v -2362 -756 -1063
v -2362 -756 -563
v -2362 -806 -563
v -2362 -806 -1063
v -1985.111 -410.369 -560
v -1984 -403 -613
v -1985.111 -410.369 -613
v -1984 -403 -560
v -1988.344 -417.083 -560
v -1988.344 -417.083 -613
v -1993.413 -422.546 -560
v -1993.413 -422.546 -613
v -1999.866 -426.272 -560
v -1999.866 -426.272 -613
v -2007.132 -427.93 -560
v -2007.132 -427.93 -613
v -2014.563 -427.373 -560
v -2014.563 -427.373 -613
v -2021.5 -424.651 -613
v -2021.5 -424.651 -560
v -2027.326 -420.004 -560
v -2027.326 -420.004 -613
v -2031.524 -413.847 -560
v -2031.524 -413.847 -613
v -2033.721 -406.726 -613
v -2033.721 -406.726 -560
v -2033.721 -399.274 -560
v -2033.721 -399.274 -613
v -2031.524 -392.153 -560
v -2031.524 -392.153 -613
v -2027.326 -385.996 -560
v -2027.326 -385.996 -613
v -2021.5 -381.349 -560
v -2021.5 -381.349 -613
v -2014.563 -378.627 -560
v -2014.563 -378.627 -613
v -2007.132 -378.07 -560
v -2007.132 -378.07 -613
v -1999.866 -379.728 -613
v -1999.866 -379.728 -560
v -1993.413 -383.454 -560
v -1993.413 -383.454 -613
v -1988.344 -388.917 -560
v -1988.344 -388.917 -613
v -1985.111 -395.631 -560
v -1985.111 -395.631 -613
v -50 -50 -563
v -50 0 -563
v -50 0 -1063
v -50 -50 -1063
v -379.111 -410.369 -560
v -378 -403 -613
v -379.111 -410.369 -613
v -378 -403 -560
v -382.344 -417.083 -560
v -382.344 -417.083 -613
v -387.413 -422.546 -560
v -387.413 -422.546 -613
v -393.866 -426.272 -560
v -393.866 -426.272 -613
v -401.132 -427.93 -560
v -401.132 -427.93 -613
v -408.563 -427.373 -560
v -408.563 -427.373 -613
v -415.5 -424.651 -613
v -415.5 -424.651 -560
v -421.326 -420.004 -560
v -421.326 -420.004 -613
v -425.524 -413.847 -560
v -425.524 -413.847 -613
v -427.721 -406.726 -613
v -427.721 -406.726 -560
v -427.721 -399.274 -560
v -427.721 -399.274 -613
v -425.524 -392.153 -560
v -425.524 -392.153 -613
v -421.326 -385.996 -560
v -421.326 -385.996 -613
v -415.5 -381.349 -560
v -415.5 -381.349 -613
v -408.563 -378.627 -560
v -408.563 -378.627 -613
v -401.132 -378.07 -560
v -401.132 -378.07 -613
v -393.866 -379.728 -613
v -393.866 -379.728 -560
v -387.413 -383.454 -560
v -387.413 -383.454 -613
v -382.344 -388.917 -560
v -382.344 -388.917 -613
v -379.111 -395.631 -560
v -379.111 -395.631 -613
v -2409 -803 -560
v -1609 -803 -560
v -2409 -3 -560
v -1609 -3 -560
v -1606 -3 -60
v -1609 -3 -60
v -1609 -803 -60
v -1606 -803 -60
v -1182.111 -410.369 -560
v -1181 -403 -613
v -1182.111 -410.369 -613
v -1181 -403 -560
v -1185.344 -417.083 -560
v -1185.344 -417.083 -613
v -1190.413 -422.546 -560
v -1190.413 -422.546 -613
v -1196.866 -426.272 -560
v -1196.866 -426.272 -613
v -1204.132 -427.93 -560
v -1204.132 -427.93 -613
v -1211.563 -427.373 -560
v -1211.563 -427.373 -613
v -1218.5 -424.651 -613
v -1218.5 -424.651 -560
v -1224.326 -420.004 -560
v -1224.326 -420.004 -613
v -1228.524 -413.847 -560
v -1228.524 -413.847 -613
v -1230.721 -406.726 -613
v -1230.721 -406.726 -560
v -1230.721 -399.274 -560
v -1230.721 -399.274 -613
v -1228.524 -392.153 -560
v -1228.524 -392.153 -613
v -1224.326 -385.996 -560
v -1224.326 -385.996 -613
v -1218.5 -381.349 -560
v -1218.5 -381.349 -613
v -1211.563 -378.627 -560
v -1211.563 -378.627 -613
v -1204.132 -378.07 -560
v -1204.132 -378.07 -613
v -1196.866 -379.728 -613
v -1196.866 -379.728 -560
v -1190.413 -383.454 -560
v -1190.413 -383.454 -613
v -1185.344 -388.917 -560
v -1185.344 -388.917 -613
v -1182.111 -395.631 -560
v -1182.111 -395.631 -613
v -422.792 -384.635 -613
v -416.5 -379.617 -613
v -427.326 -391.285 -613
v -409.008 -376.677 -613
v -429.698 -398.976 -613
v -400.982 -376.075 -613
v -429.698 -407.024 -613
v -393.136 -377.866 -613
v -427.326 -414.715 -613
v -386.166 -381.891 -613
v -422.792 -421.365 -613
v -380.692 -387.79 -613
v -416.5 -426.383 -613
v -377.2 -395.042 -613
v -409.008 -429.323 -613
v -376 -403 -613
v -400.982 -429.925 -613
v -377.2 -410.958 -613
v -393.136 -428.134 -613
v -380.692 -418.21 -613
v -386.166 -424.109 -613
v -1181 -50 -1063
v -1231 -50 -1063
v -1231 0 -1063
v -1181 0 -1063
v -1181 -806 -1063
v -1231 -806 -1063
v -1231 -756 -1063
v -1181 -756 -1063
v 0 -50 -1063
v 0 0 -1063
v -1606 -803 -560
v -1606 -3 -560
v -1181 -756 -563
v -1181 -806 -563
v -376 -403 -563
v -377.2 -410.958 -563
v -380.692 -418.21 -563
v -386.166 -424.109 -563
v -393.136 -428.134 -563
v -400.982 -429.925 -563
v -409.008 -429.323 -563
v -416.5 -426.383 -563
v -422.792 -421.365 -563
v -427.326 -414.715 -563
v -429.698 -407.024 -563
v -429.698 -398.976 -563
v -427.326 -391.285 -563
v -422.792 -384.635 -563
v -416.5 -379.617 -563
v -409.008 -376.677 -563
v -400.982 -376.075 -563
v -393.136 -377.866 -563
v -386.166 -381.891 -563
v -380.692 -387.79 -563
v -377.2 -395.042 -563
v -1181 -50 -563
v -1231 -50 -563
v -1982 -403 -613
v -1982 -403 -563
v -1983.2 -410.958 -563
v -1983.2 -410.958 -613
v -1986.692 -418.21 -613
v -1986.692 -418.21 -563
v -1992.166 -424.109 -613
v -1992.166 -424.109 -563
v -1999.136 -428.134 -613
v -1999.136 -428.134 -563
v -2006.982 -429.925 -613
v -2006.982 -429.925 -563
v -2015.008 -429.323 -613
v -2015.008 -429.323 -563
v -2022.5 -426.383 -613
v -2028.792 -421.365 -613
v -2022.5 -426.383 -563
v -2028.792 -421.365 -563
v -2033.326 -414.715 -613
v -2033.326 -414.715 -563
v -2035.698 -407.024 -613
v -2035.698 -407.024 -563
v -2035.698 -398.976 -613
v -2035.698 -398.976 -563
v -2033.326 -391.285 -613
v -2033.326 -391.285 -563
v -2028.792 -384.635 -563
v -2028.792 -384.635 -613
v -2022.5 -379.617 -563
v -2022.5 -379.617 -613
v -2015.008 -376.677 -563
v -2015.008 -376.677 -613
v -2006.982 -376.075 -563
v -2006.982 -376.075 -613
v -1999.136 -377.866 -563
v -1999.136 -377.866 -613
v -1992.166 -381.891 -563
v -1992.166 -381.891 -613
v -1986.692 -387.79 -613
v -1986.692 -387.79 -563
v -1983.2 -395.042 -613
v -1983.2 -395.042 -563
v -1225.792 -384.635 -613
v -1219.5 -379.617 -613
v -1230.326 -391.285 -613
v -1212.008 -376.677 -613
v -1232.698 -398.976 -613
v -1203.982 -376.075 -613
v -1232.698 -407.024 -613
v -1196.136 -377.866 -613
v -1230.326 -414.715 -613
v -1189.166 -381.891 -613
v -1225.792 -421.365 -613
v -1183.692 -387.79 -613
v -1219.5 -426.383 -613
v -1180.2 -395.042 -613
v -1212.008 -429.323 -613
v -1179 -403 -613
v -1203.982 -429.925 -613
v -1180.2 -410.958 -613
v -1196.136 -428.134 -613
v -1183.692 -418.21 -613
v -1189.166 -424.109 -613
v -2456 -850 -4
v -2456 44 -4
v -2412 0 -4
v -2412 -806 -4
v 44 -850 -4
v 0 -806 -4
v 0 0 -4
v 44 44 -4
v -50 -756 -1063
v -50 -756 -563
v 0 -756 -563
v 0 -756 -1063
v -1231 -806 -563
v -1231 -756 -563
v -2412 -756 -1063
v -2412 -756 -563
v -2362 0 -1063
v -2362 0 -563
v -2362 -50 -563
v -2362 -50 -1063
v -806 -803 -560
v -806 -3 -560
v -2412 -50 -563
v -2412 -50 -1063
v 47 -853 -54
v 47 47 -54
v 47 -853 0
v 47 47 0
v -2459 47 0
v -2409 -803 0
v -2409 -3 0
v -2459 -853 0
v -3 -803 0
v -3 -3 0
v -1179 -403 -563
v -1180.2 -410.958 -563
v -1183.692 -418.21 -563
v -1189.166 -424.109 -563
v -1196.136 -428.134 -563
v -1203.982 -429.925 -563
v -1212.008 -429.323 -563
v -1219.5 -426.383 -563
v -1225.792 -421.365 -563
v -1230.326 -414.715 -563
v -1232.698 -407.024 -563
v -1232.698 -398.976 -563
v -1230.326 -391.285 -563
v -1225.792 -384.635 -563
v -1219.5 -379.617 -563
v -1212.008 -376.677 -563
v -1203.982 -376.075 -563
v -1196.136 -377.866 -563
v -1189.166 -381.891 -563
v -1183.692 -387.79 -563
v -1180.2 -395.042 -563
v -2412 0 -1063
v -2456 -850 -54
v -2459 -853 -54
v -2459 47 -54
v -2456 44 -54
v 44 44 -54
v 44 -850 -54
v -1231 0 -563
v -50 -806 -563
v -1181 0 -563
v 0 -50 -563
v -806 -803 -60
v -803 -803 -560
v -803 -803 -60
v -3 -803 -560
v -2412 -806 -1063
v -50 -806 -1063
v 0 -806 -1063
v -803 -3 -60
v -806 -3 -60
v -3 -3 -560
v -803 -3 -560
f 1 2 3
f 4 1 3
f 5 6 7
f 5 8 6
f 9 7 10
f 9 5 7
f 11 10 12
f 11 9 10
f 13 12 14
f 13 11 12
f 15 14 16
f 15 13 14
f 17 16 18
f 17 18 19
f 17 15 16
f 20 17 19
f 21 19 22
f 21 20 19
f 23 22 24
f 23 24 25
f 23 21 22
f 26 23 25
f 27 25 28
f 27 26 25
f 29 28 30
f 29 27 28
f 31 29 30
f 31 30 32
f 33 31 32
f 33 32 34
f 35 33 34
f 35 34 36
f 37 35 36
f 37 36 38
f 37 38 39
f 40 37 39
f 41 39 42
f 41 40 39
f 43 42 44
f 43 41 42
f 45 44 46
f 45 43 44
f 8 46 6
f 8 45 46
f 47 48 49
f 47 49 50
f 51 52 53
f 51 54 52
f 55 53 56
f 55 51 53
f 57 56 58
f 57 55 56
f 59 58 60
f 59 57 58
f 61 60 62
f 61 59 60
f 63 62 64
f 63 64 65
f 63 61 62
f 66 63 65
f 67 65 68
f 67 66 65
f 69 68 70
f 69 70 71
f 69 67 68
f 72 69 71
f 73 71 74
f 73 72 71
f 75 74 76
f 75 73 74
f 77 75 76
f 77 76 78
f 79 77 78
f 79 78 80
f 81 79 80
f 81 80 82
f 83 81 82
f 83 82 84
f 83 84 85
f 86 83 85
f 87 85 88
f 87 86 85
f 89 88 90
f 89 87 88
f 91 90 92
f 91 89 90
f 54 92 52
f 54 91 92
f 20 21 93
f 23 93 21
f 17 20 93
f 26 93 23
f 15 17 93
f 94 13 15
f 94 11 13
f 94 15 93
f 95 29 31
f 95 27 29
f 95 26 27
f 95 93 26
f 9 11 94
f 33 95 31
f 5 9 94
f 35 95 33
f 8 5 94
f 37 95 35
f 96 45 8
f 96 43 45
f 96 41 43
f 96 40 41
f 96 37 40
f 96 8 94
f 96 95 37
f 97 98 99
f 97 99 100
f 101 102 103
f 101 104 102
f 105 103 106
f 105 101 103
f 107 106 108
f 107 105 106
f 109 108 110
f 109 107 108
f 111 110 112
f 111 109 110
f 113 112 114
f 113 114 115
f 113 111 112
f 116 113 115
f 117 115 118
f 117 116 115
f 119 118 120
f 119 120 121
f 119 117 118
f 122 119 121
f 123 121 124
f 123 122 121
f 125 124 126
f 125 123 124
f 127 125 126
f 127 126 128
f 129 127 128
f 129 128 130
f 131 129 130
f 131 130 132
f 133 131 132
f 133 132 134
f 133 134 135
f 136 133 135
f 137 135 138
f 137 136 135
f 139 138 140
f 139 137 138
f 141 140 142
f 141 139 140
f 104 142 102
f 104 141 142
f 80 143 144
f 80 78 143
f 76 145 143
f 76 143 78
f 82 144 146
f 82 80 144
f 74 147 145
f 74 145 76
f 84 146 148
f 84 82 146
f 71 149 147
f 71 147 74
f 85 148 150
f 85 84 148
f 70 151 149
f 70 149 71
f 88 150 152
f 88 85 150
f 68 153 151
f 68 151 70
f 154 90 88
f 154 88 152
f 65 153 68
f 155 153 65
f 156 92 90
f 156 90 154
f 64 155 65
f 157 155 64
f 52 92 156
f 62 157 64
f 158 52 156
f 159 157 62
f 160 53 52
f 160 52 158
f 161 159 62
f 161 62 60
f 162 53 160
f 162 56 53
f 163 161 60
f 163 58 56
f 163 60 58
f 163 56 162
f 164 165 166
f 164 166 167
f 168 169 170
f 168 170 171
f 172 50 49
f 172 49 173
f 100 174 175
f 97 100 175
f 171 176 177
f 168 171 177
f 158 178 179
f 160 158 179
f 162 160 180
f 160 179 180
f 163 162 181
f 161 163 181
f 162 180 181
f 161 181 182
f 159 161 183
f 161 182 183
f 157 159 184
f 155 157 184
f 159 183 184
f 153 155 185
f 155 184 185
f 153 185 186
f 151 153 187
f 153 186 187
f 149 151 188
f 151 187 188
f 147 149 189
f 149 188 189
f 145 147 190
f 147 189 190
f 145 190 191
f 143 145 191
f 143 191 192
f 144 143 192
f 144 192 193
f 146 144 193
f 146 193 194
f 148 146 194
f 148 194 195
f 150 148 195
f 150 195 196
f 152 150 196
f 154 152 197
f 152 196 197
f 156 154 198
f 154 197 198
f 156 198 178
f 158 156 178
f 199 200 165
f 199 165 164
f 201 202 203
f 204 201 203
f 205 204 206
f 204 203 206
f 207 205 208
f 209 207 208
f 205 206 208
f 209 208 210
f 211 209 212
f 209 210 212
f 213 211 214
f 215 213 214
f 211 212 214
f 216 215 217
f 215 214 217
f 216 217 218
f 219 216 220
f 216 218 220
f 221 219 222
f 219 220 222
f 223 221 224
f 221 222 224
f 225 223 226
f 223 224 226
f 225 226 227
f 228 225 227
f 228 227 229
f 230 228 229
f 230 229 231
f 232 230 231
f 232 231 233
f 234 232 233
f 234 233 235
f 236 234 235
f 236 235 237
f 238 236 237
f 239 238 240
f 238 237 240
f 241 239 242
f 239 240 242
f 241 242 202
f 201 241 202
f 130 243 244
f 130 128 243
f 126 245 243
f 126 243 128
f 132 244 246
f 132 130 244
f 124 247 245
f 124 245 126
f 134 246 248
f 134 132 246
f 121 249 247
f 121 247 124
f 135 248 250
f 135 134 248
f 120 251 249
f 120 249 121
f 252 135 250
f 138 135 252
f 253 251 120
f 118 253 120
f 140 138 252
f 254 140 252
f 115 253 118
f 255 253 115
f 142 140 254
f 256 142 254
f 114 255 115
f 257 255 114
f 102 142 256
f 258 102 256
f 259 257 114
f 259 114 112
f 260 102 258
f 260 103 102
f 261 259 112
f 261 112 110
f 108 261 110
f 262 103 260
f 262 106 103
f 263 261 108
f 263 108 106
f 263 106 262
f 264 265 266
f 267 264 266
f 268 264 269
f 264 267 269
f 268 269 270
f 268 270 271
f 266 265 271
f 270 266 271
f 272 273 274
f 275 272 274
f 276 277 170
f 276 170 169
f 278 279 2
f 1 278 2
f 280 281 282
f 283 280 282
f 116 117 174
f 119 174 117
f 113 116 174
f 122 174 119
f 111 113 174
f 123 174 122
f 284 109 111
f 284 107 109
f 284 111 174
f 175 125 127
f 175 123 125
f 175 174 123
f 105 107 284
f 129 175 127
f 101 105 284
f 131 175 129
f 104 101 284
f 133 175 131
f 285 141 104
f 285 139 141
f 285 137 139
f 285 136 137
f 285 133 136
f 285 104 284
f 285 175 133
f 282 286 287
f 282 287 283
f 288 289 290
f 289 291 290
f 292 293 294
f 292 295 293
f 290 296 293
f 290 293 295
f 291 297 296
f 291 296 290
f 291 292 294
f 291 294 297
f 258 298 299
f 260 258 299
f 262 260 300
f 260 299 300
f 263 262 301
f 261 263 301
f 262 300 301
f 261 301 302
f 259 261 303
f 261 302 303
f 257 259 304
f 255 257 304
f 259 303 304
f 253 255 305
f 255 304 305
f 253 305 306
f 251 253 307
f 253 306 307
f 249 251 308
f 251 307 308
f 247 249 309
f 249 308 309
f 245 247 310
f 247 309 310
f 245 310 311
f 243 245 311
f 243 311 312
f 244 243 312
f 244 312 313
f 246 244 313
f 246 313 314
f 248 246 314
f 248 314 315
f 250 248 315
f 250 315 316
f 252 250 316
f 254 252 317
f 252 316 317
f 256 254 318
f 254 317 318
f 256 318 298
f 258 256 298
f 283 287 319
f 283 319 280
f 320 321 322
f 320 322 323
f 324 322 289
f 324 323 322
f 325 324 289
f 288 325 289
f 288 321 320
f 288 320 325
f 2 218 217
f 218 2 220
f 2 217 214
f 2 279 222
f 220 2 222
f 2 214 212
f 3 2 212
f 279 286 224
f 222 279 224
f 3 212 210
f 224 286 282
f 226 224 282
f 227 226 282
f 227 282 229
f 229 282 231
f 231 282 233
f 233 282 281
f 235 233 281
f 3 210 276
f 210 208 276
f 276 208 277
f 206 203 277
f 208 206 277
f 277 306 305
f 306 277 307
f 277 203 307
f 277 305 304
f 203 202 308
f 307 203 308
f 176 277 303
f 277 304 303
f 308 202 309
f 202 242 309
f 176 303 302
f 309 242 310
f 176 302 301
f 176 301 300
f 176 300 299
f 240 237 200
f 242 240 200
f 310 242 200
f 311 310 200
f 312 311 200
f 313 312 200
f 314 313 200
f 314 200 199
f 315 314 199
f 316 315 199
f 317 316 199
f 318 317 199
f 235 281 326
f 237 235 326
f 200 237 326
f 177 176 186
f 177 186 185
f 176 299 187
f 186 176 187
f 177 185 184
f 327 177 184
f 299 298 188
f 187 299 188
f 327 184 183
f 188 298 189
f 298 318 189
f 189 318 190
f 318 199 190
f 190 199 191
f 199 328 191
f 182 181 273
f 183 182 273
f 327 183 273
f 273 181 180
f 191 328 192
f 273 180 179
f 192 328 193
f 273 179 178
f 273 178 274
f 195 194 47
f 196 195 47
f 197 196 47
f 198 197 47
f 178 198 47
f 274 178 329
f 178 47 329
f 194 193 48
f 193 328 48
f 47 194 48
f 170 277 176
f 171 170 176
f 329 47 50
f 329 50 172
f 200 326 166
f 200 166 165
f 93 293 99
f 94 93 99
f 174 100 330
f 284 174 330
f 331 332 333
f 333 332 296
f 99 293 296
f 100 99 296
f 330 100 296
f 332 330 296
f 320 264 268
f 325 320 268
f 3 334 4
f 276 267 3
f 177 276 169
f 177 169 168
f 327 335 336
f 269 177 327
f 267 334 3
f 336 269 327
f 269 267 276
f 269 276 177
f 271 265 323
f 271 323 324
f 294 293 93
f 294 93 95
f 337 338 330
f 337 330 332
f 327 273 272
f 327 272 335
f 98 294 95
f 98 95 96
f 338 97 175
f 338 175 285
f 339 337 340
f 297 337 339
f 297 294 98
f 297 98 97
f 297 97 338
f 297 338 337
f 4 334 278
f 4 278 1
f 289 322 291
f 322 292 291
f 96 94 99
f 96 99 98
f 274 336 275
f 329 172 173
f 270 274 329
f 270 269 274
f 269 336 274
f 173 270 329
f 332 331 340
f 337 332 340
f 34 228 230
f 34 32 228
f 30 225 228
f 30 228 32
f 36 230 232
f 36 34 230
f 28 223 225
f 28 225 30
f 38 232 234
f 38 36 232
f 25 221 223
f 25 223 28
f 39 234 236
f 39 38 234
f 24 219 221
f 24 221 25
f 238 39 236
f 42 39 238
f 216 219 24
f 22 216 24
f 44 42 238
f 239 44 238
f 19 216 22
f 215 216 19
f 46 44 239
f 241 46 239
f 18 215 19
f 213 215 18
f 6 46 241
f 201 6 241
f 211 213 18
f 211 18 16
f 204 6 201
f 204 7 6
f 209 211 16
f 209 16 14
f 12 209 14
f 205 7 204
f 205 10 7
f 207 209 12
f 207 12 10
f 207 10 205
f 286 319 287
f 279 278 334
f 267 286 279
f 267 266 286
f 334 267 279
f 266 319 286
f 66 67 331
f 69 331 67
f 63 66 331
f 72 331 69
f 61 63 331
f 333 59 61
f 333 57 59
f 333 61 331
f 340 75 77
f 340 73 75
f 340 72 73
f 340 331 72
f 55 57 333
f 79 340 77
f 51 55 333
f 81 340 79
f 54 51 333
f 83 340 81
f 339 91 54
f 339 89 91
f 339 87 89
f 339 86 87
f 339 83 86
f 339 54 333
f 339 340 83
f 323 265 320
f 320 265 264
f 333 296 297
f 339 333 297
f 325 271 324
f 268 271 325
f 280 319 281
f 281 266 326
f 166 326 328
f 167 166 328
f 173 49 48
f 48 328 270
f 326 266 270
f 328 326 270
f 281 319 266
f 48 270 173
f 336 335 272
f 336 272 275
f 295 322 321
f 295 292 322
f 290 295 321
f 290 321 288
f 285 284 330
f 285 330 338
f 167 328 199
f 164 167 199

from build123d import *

# Parameters (mm, degrees)
F0_W      = 2412
F0_H      = 806
F1_DEPTH  = 563
F2_T      = -3
F3_W      = 3
F3_H      = 800
F4_DEPTH  = 500
F5_W      = 2506
F5_H      = 900
F5_W_2    = 2412
F5_H_2    = 806
F6_DEPTH  = 4
F7_R      = 25
F8_DEPTH  = 25
F9_R      = 27
F9_R_2    = 25
F10_DEPTH = 50
F11_W     = 2506
F11_H     = 900
F11_W_2   = 2500
F11_H_2   = 894
F12_DEPTH = 50
F13_W     = 50
F13_H     = 50
F14_DEPTH = 500


with BuildPart() as f1:
    # F0 (on Top) → F1 (new body)
    with BuildSketch(Plane.XY):
        with Locations((-1206, -403)):
            Rectangle(F0_W, F0_H)
    extrude(amount=-F1_DEPTH)

    # F2
    f2_openings = [f1.faces().sort_by_distance(p)[0] for p in [
        (-1206, -403, 0),
    ]]
    offset(amount=F2_T, openings=f2_openings)

    # F3 (on face) → F4 (join)
    with BuildSketch(Plane.XY.offset(-560)):
        with Locations((-1607.5, -403)):
            Rectangle(F3_W, F3_H)
        with Locations((-804.5, -403)):
            Rectangle(F3_W, F3_H)
    extrude(amount=F4_DEPTH)

    # F5 (on face) → F6 (join)
    with BuildSketch(Plane.XY):
        with Locations((-1206, -403)):
            Rectangle(F5_W, F5_H)
        with Locations((-1206, -403)):
            Rectangle(F5_W_2, F5_H_2, mode=Mode.SUBTRACT)
    extrude(amount=-F6_DEPTH)

    # F7 (on face) → F8 (cut)
    with BuildSketch(Plane.XY.offset(-560)):
        with Locations((-2009, -403)):
            Circle(F7_R)
        with Locations((-1206, -403)):
            Circle(F7_R)
        with Locations((-403, -403)):
            Circle(F7_R)
    extrude(amount=-F8_DEPTH, mode=Mode.SUBTRACT)

    # F9 (on face) → F10 (join)
    with BuildSketch(Plane(origin=(0, 0, -563), x_dir=(1, 0, 0), z_dir=(0, 0, -1))):
        with Locations((-1206, 403)):
            Circle(F9_R)
        with Locations((-1206, 403)):
            Circle(F9_R_2, mode=Mode.SUBTRACT)
        with Locations((-2009, 403)):
            Circle(F9_R)
        with Locations((-2009, 403)):
            Circle(F9_R_2, mode=Mode.SUBTRACT)
        with Locations((-403, 403)):
            Circle(F9_R)
        with Locations((-403, 403)):
            Circle(F9_R_2, mode=Mode.SUBTRACT)
    extrude(amount=F10_DEPTH)

    # F11 (on face) → F12 (join)
    with BuildSketch(Plane(origin=(0, 0, -4), x_dir=(1, 0, 0), z_dir=(0, 0, -1))):
        with Locations((-1206, 403)):
            Rectangle(F11_W, F11_H)
        with Locations((-1206, 403)):
            Rectangle(F11_W_2, F11_H_2, mode=Mode.SUBTRACT)
    extrude(amount=F12_DEPTH)

    # F13 (on face) → F14 (join)
    with BuildSketch(Plane(origin=(0, 0, -563), x_dir=(1, 0, 0), z_dir=(0, 0, -1))):
        with Locations((-2387, 781)):
            Rectangle(F13_W, F13_H)
        with Locations((-2387, 25)):
            Rectangle(F13_W, F13_H)
        with Locations((-25, 781)):
            Rectangle(F13_W, F13_H)
        with Locations((-25, 25)):
            Rectangle(F13_W, F13_H)
        with Locations((-1206, 781)):
            Rectangle(F13_W, F13_H)
        with Locations((-1206, 25)):
            Rectangle(F13_W, F13_H)
    extrude(amount=F14_DEPTH)


solid = f1.part
